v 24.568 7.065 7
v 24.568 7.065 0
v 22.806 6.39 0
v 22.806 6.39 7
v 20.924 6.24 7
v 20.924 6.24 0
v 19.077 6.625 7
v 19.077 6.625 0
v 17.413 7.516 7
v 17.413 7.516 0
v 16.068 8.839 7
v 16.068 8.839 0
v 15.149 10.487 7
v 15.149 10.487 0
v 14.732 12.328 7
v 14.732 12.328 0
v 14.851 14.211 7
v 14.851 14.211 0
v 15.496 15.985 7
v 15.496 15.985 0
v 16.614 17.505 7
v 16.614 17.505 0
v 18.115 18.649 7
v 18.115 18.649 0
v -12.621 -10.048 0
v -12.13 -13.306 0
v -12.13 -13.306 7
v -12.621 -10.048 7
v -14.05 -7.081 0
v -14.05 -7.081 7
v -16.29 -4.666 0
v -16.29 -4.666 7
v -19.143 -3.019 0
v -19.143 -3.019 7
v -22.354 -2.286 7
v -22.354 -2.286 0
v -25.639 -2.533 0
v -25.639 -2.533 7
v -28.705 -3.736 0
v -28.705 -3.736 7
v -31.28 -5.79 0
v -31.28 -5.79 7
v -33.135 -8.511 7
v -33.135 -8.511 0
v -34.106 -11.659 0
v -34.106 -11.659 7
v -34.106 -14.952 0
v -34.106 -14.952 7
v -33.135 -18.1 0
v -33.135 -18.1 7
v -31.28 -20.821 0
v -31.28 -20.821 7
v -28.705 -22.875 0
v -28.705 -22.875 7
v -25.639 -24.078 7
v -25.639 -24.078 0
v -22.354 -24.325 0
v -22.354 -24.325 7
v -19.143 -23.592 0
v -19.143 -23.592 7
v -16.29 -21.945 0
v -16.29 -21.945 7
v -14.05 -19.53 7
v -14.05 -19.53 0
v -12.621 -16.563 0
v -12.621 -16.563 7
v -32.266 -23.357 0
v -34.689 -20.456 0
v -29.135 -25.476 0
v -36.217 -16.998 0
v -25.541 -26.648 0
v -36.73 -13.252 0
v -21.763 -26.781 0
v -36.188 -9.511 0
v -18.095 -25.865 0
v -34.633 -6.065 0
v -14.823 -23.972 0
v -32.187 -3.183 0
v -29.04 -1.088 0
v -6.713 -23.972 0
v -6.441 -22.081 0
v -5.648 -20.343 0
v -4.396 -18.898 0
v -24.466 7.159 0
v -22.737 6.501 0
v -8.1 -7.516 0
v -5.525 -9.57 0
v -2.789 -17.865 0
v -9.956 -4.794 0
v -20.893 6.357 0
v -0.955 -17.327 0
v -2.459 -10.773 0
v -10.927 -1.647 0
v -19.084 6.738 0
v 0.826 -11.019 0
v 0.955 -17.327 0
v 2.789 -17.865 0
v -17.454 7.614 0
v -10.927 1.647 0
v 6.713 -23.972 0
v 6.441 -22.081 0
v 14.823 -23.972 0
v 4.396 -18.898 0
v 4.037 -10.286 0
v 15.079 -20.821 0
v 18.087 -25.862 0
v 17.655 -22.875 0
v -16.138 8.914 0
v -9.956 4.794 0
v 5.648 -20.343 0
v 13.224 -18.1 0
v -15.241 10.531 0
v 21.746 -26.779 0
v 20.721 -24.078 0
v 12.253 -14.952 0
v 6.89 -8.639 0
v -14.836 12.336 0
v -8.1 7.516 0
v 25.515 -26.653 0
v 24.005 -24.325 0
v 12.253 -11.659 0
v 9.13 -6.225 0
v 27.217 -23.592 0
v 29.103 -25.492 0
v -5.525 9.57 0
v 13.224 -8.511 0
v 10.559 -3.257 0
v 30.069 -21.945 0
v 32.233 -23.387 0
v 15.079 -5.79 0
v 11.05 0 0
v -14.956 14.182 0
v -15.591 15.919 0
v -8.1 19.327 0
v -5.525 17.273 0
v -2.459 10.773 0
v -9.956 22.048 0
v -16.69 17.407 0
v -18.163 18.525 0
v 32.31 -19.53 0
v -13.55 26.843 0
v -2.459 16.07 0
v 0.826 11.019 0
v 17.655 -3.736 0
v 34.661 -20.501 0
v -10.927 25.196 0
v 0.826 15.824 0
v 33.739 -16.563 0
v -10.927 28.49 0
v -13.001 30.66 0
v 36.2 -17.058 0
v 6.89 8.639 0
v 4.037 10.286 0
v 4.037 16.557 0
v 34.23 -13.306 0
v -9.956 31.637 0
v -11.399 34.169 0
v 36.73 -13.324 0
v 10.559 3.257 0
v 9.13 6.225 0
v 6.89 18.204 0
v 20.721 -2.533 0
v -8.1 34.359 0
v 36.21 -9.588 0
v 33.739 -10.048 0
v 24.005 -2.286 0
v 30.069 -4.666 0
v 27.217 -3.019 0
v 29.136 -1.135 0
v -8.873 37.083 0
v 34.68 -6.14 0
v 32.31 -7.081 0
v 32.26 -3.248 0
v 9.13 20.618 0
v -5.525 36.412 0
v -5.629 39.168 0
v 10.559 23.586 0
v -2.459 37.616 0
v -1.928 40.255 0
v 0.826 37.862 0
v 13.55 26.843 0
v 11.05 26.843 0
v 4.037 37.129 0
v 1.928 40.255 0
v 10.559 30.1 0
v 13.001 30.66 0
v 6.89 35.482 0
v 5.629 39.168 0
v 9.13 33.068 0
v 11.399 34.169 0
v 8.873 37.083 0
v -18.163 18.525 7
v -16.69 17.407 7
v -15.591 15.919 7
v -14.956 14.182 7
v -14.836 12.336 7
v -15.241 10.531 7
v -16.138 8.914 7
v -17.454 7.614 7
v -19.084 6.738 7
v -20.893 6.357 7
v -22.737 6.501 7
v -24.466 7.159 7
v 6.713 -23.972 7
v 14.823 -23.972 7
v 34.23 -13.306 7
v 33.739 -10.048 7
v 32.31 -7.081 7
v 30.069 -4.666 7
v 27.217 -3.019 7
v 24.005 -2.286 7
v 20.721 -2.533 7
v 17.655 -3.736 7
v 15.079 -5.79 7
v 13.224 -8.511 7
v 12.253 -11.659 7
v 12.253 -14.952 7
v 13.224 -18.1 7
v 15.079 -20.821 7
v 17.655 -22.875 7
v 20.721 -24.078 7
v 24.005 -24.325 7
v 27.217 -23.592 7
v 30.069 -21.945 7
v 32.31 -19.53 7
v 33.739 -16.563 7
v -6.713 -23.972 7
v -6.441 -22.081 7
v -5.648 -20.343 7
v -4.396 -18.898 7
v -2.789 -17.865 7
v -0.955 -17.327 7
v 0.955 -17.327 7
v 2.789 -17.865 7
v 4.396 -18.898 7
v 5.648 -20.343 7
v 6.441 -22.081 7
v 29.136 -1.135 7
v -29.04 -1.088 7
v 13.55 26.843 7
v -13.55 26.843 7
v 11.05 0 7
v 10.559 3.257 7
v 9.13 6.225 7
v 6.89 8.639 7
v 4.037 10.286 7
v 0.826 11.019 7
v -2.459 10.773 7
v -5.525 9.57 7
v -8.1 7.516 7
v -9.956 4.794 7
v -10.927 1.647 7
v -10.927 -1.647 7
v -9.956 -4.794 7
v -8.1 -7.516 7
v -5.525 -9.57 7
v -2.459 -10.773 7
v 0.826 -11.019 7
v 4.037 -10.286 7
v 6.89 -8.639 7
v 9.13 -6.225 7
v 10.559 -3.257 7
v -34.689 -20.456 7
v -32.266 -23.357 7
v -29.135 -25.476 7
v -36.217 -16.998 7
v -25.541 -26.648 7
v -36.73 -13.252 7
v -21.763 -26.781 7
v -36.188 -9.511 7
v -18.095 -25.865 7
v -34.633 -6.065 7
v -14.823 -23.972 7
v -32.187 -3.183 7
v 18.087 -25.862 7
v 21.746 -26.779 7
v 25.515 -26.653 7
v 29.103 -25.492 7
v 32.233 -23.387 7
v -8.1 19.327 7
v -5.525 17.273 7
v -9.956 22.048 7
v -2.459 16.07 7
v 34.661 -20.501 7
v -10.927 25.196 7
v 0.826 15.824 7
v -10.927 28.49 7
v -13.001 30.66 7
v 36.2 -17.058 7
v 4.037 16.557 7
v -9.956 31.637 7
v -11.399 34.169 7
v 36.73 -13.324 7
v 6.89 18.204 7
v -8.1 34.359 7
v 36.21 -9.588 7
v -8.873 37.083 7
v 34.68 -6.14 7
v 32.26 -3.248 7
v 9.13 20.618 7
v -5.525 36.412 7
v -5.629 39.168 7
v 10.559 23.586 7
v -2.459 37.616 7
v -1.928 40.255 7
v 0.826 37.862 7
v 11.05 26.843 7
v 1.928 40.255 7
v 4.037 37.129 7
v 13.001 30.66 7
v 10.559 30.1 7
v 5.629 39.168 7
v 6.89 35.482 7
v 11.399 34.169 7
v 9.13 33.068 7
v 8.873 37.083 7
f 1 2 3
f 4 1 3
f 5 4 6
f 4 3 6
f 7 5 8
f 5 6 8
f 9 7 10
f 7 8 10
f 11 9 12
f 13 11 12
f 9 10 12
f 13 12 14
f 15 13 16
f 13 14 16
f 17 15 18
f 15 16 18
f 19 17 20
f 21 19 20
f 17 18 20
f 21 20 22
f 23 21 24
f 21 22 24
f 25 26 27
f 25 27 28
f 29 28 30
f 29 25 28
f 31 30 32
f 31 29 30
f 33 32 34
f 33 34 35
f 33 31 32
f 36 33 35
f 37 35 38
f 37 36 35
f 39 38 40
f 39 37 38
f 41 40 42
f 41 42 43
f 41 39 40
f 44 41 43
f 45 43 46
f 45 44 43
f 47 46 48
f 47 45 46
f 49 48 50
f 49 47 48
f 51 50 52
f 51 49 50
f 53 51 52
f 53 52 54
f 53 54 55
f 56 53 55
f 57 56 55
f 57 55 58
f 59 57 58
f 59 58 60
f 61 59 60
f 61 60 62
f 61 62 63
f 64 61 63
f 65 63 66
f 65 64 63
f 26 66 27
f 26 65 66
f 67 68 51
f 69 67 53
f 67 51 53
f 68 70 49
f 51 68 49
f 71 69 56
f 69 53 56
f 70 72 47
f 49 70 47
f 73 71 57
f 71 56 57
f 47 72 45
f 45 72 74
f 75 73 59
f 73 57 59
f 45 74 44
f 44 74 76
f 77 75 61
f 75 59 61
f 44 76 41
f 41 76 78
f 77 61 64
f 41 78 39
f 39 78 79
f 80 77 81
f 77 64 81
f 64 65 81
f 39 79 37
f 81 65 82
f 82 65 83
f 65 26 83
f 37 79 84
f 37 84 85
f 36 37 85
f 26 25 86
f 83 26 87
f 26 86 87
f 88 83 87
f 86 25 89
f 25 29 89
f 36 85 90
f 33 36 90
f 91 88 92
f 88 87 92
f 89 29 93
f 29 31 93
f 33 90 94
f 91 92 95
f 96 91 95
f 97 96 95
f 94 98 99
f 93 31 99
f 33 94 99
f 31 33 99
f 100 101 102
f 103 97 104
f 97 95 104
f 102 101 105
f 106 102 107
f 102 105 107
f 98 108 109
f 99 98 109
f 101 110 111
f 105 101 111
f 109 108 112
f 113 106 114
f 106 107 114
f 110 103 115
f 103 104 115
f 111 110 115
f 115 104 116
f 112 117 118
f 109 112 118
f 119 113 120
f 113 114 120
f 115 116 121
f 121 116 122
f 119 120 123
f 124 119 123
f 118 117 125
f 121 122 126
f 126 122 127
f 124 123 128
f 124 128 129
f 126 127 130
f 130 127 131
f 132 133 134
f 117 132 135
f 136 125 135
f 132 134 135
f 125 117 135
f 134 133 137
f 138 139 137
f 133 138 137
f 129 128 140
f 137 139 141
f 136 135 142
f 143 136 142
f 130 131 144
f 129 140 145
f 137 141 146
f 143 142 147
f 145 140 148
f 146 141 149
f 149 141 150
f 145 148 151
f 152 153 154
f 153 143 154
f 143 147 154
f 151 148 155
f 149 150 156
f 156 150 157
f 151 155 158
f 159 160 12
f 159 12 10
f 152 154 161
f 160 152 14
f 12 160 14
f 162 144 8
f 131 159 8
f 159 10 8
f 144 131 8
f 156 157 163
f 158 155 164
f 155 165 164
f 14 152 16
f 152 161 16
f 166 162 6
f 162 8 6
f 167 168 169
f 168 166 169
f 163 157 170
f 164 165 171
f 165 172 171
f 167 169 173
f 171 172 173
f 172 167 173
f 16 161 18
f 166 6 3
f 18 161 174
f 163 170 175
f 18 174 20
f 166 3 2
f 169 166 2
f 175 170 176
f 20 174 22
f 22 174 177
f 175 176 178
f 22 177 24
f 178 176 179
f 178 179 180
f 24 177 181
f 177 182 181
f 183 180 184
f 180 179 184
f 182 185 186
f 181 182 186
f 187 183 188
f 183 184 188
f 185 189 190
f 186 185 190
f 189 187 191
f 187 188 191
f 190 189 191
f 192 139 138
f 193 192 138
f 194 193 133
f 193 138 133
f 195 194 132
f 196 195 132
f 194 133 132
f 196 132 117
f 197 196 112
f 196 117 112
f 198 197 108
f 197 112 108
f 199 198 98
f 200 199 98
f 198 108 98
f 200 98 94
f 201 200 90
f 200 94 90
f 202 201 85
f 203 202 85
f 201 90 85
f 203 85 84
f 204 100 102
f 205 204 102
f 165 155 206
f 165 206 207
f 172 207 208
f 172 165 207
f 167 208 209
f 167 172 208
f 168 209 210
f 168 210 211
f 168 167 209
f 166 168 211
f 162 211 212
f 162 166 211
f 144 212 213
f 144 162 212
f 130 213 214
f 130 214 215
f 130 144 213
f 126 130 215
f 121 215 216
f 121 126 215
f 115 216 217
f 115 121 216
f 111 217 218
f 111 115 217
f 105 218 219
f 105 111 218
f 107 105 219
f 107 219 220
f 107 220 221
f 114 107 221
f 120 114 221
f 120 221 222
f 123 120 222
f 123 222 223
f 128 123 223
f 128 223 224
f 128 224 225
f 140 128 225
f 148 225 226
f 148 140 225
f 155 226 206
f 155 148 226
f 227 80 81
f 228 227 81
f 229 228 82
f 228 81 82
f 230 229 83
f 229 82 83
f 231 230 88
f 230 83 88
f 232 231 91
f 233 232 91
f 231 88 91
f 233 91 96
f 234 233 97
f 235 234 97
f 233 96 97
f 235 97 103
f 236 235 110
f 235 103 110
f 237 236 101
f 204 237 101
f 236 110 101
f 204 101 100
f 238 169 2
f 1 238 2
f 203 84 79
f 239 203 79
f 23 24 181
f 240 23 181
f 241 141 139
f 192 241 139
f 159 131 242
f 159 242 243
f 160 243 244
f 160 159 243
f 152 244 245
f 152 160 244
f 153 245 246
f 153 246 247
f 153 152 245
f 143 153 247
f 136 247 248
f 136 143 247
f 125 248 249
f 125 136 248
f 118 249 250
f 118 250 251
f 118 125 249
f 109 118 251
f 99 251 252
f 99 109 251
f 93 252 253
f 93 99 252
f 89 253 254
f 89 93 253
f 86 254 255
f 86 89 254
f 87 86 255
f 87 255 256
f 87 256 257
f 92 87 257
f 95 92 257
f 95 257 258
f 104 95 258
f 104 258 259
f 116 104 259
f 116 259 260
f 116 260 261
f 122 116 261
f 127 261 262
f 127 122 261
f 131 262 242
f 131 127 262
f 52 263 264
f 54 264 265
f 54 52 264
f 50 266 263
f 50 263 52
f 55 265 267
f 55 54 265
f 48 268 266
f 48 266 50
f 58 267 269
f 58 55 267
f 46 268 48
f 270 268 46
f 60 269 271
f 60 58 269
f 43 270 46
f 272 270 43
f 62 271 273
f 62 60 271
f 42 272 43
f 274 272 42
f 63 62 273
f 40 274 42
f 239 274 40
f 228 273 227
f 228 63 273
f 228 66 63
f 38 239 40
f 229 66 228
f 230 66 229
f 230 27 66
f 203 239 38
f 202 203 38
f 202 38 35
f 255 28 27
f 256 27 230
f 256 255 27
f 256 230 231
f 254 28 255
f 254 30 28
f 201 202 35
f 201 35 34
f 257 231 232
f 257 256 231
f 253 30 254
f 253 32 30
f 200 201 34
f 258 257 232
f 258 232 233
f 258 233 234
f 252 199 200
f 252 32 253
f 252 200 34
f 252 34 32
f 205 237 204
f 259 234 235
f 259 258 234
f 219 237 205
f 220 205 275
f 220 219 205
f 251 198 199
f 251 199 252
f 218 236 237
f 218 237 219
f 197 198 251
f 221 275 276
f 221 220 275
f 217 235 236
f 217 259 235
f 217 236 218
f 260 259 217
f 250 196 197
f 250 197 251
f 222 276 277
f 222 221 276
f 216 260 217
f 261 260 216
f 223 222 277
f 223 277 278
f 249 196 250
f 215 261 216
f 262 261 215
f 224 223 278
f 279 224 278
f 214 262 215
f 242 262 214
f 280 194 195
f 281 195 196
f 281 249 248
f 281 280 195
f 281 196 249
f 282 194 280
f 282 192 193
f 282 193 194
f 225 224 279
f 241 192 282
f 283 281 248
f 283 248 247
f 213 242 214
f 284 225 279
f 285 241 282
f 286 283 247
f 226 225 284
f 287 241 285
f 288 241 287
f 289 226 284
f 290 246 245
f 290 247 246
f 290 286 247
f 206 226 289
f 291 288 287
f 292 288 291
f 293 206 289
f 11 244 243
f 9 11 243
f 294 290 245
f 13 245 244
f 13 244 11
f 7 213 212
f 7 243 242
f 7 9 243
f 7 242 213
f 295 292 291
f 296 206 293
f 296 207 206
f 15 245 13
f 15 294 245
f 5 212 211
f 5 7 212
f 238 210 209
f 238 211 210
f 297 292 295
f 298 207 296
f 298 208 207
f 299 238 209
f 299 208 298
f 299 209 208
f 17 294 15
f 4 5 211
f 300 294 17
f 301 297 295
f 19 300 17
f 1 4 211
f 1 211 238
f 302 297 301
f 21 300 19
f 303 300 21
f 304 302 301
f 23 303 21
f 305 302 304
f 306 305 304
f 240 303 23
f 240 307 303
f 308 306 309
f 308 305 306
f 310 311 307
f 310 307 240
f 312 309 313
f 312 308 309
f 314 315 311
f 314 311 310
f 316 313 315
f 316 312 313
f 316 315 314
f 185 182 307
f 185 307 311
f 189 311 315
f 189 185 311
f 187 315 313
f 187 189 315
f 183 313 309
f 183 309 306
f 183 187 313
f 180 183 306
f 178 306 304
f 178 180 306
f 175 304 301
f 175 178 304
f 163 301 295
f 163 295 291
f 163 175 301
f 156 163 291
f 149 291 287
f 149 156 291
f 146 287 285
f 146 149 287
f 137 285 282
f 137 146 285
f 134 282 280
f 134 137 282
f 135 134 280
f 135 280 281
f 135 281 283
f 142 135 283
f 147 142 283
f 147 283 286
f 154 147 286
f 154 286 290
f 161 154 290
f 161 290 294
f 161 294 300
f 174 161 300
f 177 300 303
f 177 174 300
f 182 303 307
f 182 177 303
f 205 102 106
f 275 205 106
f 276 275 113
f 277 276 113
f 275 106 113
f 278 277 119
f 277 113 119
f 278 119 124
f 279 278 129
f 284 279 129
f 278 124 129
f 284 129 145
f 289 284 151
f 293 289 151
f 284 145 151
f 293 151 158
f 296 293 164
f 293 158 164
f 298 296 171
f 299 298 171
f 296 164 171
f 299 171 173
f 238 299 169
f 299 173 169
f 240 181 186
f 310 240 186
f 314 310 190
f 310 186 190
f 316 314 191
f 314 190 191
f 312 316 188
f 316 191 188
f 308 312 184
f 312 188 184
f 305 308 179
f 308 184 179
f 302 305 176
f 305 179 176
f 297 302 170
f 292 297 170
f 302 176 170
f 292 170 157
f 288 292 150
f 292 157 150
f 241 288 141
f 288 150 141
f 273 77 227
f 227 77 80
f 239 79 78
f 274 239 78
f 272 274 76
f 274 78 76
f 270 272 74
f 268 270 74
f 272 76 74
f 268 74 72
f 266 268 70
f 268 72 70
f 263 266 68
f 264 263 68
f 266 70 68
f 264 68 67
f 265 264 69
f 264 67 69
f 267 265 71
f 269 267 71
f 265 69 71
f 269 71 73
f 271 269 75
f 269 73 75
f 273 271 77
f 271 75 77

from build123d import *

# Parameters (mm, degrees)
F0_R     = 11.05
F1_DEPTH = 7


with BuildPart() as f1:
    # F0 (on Top) → F1 (new body)
    with BuildSketch(Plane.XY):
        with BuildLine():
            Line((18.114797, 18.648818), (13.55, 26.842903))
            ThreePointArc((13.55, 26.842903), (0, 40.392903), (-13.55, 26.842903))
            Line((-13.55, 26.842903), (-18.163027, 18.52472))
            ThreePointArc((-18.163027, 18.52472), (-15.631693, 9.690215), (-24.466198, 7.15888))
            Line((-24.466198, 7.15888), (-29.039817, -1.088241))
            ThreePointArc((-29.039817, -1.088241), (-34.68947, -20.455852), (-14.823439, -23.972062))
            Line((-14.823439, -23.972062), (-6.713385, -23.972062))
            ThreePointArc((-6.713385, -23.972062), (0, -17.258678), (6.713385, -23.972062))
            Line((6.713385, -23.972062), (14.823439, -23.972062))
            ThreePointArc((14.823439, -23.972062), (34.661194, -20.501168), (29.135954, -1.134821))
            Line((29.135954, -1.134821), (24.568158, 7.064647))
            ThreePointArc((24.568158, 7.064647), (15.549392, 9.630052), (18.114797, 18.648818))
        make_face()
        with Locations((-23.179692, -13.305501)):
            Circle(F0_R, mode=Mode.SUBTRACT)
        with Locations((23.179692, -13.305501)):
            Circle(F0_R, mode=Mode.SUBTRACT)
        Circle(F0_R, mode=Mode.SUBTRACT)
        with Locations((0, 26.842903)):
            Circle(F0_R, mode=Mode.SUBTRACT)
    extrude(amount=F1_DEPTH)


solid = f1.part
